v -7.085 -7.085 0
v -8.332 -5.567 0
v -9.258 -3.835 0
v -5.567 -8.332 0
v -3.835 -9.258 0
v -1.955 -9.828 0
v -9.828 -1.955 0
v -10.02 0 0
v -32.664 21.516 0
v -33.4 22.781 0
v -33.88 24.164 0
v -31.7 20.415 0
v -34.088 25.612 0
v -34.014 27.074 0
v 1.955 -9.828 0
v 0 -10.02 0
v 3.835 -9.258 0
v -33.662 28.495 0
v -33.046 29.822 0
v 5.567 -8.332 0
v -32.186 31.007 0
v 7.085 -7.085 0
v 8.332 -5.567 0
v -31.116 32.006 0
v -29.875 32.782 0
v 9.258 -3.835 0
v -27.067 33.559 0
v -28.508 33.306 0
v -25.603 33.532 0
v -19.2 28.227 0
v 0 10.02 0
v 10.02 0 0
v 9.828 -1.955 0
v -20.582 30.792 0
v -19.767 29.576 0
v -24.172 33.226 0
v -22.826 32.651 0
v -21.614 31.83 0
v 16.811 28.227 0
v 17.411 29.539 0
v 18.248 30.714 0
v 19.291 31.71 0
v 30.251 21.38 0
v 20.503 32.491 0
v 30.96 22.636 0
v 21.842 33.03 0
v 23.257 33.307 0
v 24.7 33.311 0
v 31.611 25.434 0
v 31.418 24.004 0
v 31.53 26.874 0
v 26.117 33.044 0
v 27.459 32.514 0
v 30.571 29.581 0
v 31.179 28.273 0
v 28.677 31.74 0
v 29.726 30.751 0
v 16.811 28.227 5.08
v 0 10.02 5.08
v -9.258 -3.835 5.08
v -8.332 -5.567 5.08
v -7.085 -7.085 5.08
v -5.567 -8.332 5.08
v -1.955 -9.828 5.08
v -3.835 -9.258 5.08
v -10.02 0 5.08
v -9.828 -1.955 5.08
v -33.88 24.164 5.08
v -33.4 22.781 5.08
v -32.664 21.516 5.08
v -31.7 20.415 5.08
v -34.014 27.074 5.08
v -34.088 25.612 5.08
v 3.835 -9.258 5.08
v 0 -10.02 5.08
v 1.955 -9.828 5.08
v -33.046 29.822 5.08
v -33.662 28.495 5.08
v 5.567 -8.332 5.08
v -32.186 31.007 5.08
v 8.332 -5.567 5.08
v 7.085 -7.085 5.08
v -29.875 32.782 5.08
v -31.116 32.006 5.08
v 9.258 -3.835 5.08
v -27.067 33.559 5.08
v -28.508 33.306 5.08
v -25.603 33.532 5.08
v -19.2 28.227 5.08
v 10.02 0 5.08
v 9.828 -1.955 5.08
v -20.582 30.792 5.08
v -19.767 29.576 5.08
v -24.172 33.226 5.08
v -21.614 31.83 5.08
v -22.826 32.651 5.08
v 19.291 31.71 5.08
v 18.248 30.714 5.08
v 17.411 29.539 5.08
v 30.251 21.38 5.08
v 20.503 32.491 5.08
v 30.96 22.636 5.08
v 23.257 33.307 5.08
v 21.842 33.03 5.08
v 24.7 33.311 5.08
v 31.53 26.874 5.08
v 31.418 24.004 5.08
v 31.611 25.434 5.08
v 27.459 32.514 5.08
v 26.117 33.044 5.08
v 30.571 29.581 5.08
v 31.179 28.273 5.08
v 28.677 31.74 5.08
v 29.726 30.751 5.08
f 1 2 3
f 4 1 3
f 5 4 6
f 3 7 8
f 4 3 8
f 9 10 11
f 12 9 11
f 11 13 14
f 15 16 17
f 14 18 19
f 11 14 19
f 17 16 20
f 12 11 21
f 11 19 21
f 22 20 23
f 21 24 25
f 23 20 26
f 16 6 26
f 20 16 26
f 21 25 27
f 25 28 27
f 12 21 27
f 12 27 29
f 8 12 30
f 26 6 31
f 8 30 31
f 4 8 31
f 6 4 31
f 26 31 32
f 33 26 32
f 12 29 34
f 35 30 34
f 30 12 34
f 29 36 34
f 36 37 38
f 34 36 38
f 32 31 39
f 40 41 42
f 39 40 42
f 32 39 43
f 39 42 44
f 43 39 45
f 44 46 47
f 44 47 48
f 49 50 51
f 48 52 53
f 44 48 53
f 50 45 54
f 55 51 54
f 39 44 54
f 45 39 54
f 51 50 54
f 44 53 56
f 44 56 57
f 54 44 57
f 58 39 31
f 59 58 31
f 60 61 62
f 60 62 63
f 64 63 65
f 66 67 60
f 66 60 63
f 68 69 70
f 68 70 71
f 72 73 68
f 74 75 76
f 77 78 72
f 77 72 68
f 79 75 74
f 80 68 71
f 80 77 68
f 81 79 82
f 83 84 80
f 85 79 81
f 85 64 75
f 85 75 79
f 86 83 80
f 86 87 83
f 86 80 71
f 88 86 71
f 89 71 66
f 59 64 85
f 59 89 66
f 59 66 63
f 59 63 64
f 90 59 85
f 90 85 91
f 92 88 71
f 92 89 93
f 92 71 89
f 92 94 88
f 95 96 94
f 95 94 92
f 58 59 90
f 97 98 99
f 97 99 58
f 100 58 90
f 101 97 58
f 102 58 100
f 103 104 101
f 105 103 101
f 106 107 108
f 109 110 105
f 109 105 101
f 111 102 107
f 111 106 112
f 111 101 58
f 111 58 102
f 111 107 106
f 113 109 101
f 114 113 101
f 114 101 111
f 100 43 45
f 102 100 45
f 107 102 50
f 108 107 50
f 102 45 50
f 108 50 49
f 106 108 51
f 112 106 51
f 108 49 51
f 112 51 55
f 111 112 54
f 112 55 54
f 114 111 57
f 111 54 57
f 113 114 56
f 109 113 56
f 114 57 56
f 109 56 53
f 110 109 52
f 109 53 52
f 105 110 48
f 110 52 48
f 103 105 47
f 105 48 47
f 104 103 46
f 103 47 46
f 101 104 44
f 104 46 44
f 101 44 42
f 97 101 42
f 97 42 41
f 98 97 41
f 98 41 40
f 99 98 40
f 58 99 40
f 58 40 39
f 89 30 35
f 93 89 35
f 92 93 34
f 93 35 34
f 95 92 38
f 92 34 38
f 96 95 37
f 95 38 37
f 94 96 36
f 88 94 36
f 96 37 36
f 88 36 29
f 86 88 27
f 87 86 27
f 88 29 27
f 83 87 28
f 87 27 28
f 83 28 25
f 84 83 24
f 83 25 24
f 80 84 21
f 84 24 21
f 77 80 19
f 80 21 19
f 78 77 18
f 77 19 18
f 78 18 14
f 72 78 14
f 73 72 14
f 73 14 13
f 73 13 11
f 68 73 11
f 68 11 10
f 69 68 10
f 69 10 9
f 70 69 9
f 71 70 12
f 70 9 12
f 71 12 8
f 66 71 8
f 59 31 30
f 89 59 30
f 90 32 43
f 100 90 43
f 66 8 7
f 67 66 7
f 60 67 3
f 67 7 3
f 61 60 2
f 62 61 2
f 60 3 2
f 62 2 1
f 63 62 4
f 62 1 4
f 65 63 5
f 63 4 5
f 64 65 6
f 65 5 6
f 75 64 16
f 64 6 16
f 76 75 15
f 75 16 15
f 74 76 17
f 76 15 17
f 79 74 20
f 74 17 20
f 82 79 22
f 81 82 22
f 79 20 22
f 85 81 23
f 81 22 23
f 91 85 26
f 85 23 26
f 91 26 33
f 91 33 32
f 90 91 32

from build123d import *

# Parameters (mm, degrees)
F4_DEPTH = 5.08


# Not quite as in the source:
# - the program builds the solid bodies; features that only make, move or delete a surface that nothing else refers to are left out


with BuildPart() as f4:
    # F0 (on Top) → F4 (new body)
    with BuildSketch(Plane.XY):
        with BuildLine():
            ThreePointArc((0, 10.0203), (7.0854220795, 7.0854220795), (10.0203, 0))
            Line((10.0203, 0), (30.2514023598, 21.3797036526))
            ThreePointArc((30.2514023598, 21.3797036526), (27.4591098659, 32.5138598171), (16.8107412275, 28.2268356499))
            Line((16.8107412275, 28.2268356499), (0, 10.0203))
        make_face()
        with BuildLine():
            ThreePointArc((-10.0203, 0), (-7.0854220795, 7.0854220795), (0, 10.0203))
            Line((0, 10.0203), (-19.2001006115, 28.2268356499))
            ThreePointArc((-19.2001006115, 28.2268356499), (-30.5143757694, 32.4238900578), (-31.6996835172, 20.4145964235))
            Line((-31.6996835172, 20.4145964235), (-10.0203, 0))
        make_face()
        with BuildLine():
            ThreePointArc((-10.0203, 0), (0, -10.0203), (10.0203, 0))
            ThreePointArc((10.0203, 0), (7.0854220795, 7.0854220795), (0, 10.0203))
            ThreePointArc((0, 10.0203), (-7.0854220795, 7.0854220795), (-10.0203, 0))
        make_face()
    extrude(amount=F4_DEPTH)


solid = f4.part
